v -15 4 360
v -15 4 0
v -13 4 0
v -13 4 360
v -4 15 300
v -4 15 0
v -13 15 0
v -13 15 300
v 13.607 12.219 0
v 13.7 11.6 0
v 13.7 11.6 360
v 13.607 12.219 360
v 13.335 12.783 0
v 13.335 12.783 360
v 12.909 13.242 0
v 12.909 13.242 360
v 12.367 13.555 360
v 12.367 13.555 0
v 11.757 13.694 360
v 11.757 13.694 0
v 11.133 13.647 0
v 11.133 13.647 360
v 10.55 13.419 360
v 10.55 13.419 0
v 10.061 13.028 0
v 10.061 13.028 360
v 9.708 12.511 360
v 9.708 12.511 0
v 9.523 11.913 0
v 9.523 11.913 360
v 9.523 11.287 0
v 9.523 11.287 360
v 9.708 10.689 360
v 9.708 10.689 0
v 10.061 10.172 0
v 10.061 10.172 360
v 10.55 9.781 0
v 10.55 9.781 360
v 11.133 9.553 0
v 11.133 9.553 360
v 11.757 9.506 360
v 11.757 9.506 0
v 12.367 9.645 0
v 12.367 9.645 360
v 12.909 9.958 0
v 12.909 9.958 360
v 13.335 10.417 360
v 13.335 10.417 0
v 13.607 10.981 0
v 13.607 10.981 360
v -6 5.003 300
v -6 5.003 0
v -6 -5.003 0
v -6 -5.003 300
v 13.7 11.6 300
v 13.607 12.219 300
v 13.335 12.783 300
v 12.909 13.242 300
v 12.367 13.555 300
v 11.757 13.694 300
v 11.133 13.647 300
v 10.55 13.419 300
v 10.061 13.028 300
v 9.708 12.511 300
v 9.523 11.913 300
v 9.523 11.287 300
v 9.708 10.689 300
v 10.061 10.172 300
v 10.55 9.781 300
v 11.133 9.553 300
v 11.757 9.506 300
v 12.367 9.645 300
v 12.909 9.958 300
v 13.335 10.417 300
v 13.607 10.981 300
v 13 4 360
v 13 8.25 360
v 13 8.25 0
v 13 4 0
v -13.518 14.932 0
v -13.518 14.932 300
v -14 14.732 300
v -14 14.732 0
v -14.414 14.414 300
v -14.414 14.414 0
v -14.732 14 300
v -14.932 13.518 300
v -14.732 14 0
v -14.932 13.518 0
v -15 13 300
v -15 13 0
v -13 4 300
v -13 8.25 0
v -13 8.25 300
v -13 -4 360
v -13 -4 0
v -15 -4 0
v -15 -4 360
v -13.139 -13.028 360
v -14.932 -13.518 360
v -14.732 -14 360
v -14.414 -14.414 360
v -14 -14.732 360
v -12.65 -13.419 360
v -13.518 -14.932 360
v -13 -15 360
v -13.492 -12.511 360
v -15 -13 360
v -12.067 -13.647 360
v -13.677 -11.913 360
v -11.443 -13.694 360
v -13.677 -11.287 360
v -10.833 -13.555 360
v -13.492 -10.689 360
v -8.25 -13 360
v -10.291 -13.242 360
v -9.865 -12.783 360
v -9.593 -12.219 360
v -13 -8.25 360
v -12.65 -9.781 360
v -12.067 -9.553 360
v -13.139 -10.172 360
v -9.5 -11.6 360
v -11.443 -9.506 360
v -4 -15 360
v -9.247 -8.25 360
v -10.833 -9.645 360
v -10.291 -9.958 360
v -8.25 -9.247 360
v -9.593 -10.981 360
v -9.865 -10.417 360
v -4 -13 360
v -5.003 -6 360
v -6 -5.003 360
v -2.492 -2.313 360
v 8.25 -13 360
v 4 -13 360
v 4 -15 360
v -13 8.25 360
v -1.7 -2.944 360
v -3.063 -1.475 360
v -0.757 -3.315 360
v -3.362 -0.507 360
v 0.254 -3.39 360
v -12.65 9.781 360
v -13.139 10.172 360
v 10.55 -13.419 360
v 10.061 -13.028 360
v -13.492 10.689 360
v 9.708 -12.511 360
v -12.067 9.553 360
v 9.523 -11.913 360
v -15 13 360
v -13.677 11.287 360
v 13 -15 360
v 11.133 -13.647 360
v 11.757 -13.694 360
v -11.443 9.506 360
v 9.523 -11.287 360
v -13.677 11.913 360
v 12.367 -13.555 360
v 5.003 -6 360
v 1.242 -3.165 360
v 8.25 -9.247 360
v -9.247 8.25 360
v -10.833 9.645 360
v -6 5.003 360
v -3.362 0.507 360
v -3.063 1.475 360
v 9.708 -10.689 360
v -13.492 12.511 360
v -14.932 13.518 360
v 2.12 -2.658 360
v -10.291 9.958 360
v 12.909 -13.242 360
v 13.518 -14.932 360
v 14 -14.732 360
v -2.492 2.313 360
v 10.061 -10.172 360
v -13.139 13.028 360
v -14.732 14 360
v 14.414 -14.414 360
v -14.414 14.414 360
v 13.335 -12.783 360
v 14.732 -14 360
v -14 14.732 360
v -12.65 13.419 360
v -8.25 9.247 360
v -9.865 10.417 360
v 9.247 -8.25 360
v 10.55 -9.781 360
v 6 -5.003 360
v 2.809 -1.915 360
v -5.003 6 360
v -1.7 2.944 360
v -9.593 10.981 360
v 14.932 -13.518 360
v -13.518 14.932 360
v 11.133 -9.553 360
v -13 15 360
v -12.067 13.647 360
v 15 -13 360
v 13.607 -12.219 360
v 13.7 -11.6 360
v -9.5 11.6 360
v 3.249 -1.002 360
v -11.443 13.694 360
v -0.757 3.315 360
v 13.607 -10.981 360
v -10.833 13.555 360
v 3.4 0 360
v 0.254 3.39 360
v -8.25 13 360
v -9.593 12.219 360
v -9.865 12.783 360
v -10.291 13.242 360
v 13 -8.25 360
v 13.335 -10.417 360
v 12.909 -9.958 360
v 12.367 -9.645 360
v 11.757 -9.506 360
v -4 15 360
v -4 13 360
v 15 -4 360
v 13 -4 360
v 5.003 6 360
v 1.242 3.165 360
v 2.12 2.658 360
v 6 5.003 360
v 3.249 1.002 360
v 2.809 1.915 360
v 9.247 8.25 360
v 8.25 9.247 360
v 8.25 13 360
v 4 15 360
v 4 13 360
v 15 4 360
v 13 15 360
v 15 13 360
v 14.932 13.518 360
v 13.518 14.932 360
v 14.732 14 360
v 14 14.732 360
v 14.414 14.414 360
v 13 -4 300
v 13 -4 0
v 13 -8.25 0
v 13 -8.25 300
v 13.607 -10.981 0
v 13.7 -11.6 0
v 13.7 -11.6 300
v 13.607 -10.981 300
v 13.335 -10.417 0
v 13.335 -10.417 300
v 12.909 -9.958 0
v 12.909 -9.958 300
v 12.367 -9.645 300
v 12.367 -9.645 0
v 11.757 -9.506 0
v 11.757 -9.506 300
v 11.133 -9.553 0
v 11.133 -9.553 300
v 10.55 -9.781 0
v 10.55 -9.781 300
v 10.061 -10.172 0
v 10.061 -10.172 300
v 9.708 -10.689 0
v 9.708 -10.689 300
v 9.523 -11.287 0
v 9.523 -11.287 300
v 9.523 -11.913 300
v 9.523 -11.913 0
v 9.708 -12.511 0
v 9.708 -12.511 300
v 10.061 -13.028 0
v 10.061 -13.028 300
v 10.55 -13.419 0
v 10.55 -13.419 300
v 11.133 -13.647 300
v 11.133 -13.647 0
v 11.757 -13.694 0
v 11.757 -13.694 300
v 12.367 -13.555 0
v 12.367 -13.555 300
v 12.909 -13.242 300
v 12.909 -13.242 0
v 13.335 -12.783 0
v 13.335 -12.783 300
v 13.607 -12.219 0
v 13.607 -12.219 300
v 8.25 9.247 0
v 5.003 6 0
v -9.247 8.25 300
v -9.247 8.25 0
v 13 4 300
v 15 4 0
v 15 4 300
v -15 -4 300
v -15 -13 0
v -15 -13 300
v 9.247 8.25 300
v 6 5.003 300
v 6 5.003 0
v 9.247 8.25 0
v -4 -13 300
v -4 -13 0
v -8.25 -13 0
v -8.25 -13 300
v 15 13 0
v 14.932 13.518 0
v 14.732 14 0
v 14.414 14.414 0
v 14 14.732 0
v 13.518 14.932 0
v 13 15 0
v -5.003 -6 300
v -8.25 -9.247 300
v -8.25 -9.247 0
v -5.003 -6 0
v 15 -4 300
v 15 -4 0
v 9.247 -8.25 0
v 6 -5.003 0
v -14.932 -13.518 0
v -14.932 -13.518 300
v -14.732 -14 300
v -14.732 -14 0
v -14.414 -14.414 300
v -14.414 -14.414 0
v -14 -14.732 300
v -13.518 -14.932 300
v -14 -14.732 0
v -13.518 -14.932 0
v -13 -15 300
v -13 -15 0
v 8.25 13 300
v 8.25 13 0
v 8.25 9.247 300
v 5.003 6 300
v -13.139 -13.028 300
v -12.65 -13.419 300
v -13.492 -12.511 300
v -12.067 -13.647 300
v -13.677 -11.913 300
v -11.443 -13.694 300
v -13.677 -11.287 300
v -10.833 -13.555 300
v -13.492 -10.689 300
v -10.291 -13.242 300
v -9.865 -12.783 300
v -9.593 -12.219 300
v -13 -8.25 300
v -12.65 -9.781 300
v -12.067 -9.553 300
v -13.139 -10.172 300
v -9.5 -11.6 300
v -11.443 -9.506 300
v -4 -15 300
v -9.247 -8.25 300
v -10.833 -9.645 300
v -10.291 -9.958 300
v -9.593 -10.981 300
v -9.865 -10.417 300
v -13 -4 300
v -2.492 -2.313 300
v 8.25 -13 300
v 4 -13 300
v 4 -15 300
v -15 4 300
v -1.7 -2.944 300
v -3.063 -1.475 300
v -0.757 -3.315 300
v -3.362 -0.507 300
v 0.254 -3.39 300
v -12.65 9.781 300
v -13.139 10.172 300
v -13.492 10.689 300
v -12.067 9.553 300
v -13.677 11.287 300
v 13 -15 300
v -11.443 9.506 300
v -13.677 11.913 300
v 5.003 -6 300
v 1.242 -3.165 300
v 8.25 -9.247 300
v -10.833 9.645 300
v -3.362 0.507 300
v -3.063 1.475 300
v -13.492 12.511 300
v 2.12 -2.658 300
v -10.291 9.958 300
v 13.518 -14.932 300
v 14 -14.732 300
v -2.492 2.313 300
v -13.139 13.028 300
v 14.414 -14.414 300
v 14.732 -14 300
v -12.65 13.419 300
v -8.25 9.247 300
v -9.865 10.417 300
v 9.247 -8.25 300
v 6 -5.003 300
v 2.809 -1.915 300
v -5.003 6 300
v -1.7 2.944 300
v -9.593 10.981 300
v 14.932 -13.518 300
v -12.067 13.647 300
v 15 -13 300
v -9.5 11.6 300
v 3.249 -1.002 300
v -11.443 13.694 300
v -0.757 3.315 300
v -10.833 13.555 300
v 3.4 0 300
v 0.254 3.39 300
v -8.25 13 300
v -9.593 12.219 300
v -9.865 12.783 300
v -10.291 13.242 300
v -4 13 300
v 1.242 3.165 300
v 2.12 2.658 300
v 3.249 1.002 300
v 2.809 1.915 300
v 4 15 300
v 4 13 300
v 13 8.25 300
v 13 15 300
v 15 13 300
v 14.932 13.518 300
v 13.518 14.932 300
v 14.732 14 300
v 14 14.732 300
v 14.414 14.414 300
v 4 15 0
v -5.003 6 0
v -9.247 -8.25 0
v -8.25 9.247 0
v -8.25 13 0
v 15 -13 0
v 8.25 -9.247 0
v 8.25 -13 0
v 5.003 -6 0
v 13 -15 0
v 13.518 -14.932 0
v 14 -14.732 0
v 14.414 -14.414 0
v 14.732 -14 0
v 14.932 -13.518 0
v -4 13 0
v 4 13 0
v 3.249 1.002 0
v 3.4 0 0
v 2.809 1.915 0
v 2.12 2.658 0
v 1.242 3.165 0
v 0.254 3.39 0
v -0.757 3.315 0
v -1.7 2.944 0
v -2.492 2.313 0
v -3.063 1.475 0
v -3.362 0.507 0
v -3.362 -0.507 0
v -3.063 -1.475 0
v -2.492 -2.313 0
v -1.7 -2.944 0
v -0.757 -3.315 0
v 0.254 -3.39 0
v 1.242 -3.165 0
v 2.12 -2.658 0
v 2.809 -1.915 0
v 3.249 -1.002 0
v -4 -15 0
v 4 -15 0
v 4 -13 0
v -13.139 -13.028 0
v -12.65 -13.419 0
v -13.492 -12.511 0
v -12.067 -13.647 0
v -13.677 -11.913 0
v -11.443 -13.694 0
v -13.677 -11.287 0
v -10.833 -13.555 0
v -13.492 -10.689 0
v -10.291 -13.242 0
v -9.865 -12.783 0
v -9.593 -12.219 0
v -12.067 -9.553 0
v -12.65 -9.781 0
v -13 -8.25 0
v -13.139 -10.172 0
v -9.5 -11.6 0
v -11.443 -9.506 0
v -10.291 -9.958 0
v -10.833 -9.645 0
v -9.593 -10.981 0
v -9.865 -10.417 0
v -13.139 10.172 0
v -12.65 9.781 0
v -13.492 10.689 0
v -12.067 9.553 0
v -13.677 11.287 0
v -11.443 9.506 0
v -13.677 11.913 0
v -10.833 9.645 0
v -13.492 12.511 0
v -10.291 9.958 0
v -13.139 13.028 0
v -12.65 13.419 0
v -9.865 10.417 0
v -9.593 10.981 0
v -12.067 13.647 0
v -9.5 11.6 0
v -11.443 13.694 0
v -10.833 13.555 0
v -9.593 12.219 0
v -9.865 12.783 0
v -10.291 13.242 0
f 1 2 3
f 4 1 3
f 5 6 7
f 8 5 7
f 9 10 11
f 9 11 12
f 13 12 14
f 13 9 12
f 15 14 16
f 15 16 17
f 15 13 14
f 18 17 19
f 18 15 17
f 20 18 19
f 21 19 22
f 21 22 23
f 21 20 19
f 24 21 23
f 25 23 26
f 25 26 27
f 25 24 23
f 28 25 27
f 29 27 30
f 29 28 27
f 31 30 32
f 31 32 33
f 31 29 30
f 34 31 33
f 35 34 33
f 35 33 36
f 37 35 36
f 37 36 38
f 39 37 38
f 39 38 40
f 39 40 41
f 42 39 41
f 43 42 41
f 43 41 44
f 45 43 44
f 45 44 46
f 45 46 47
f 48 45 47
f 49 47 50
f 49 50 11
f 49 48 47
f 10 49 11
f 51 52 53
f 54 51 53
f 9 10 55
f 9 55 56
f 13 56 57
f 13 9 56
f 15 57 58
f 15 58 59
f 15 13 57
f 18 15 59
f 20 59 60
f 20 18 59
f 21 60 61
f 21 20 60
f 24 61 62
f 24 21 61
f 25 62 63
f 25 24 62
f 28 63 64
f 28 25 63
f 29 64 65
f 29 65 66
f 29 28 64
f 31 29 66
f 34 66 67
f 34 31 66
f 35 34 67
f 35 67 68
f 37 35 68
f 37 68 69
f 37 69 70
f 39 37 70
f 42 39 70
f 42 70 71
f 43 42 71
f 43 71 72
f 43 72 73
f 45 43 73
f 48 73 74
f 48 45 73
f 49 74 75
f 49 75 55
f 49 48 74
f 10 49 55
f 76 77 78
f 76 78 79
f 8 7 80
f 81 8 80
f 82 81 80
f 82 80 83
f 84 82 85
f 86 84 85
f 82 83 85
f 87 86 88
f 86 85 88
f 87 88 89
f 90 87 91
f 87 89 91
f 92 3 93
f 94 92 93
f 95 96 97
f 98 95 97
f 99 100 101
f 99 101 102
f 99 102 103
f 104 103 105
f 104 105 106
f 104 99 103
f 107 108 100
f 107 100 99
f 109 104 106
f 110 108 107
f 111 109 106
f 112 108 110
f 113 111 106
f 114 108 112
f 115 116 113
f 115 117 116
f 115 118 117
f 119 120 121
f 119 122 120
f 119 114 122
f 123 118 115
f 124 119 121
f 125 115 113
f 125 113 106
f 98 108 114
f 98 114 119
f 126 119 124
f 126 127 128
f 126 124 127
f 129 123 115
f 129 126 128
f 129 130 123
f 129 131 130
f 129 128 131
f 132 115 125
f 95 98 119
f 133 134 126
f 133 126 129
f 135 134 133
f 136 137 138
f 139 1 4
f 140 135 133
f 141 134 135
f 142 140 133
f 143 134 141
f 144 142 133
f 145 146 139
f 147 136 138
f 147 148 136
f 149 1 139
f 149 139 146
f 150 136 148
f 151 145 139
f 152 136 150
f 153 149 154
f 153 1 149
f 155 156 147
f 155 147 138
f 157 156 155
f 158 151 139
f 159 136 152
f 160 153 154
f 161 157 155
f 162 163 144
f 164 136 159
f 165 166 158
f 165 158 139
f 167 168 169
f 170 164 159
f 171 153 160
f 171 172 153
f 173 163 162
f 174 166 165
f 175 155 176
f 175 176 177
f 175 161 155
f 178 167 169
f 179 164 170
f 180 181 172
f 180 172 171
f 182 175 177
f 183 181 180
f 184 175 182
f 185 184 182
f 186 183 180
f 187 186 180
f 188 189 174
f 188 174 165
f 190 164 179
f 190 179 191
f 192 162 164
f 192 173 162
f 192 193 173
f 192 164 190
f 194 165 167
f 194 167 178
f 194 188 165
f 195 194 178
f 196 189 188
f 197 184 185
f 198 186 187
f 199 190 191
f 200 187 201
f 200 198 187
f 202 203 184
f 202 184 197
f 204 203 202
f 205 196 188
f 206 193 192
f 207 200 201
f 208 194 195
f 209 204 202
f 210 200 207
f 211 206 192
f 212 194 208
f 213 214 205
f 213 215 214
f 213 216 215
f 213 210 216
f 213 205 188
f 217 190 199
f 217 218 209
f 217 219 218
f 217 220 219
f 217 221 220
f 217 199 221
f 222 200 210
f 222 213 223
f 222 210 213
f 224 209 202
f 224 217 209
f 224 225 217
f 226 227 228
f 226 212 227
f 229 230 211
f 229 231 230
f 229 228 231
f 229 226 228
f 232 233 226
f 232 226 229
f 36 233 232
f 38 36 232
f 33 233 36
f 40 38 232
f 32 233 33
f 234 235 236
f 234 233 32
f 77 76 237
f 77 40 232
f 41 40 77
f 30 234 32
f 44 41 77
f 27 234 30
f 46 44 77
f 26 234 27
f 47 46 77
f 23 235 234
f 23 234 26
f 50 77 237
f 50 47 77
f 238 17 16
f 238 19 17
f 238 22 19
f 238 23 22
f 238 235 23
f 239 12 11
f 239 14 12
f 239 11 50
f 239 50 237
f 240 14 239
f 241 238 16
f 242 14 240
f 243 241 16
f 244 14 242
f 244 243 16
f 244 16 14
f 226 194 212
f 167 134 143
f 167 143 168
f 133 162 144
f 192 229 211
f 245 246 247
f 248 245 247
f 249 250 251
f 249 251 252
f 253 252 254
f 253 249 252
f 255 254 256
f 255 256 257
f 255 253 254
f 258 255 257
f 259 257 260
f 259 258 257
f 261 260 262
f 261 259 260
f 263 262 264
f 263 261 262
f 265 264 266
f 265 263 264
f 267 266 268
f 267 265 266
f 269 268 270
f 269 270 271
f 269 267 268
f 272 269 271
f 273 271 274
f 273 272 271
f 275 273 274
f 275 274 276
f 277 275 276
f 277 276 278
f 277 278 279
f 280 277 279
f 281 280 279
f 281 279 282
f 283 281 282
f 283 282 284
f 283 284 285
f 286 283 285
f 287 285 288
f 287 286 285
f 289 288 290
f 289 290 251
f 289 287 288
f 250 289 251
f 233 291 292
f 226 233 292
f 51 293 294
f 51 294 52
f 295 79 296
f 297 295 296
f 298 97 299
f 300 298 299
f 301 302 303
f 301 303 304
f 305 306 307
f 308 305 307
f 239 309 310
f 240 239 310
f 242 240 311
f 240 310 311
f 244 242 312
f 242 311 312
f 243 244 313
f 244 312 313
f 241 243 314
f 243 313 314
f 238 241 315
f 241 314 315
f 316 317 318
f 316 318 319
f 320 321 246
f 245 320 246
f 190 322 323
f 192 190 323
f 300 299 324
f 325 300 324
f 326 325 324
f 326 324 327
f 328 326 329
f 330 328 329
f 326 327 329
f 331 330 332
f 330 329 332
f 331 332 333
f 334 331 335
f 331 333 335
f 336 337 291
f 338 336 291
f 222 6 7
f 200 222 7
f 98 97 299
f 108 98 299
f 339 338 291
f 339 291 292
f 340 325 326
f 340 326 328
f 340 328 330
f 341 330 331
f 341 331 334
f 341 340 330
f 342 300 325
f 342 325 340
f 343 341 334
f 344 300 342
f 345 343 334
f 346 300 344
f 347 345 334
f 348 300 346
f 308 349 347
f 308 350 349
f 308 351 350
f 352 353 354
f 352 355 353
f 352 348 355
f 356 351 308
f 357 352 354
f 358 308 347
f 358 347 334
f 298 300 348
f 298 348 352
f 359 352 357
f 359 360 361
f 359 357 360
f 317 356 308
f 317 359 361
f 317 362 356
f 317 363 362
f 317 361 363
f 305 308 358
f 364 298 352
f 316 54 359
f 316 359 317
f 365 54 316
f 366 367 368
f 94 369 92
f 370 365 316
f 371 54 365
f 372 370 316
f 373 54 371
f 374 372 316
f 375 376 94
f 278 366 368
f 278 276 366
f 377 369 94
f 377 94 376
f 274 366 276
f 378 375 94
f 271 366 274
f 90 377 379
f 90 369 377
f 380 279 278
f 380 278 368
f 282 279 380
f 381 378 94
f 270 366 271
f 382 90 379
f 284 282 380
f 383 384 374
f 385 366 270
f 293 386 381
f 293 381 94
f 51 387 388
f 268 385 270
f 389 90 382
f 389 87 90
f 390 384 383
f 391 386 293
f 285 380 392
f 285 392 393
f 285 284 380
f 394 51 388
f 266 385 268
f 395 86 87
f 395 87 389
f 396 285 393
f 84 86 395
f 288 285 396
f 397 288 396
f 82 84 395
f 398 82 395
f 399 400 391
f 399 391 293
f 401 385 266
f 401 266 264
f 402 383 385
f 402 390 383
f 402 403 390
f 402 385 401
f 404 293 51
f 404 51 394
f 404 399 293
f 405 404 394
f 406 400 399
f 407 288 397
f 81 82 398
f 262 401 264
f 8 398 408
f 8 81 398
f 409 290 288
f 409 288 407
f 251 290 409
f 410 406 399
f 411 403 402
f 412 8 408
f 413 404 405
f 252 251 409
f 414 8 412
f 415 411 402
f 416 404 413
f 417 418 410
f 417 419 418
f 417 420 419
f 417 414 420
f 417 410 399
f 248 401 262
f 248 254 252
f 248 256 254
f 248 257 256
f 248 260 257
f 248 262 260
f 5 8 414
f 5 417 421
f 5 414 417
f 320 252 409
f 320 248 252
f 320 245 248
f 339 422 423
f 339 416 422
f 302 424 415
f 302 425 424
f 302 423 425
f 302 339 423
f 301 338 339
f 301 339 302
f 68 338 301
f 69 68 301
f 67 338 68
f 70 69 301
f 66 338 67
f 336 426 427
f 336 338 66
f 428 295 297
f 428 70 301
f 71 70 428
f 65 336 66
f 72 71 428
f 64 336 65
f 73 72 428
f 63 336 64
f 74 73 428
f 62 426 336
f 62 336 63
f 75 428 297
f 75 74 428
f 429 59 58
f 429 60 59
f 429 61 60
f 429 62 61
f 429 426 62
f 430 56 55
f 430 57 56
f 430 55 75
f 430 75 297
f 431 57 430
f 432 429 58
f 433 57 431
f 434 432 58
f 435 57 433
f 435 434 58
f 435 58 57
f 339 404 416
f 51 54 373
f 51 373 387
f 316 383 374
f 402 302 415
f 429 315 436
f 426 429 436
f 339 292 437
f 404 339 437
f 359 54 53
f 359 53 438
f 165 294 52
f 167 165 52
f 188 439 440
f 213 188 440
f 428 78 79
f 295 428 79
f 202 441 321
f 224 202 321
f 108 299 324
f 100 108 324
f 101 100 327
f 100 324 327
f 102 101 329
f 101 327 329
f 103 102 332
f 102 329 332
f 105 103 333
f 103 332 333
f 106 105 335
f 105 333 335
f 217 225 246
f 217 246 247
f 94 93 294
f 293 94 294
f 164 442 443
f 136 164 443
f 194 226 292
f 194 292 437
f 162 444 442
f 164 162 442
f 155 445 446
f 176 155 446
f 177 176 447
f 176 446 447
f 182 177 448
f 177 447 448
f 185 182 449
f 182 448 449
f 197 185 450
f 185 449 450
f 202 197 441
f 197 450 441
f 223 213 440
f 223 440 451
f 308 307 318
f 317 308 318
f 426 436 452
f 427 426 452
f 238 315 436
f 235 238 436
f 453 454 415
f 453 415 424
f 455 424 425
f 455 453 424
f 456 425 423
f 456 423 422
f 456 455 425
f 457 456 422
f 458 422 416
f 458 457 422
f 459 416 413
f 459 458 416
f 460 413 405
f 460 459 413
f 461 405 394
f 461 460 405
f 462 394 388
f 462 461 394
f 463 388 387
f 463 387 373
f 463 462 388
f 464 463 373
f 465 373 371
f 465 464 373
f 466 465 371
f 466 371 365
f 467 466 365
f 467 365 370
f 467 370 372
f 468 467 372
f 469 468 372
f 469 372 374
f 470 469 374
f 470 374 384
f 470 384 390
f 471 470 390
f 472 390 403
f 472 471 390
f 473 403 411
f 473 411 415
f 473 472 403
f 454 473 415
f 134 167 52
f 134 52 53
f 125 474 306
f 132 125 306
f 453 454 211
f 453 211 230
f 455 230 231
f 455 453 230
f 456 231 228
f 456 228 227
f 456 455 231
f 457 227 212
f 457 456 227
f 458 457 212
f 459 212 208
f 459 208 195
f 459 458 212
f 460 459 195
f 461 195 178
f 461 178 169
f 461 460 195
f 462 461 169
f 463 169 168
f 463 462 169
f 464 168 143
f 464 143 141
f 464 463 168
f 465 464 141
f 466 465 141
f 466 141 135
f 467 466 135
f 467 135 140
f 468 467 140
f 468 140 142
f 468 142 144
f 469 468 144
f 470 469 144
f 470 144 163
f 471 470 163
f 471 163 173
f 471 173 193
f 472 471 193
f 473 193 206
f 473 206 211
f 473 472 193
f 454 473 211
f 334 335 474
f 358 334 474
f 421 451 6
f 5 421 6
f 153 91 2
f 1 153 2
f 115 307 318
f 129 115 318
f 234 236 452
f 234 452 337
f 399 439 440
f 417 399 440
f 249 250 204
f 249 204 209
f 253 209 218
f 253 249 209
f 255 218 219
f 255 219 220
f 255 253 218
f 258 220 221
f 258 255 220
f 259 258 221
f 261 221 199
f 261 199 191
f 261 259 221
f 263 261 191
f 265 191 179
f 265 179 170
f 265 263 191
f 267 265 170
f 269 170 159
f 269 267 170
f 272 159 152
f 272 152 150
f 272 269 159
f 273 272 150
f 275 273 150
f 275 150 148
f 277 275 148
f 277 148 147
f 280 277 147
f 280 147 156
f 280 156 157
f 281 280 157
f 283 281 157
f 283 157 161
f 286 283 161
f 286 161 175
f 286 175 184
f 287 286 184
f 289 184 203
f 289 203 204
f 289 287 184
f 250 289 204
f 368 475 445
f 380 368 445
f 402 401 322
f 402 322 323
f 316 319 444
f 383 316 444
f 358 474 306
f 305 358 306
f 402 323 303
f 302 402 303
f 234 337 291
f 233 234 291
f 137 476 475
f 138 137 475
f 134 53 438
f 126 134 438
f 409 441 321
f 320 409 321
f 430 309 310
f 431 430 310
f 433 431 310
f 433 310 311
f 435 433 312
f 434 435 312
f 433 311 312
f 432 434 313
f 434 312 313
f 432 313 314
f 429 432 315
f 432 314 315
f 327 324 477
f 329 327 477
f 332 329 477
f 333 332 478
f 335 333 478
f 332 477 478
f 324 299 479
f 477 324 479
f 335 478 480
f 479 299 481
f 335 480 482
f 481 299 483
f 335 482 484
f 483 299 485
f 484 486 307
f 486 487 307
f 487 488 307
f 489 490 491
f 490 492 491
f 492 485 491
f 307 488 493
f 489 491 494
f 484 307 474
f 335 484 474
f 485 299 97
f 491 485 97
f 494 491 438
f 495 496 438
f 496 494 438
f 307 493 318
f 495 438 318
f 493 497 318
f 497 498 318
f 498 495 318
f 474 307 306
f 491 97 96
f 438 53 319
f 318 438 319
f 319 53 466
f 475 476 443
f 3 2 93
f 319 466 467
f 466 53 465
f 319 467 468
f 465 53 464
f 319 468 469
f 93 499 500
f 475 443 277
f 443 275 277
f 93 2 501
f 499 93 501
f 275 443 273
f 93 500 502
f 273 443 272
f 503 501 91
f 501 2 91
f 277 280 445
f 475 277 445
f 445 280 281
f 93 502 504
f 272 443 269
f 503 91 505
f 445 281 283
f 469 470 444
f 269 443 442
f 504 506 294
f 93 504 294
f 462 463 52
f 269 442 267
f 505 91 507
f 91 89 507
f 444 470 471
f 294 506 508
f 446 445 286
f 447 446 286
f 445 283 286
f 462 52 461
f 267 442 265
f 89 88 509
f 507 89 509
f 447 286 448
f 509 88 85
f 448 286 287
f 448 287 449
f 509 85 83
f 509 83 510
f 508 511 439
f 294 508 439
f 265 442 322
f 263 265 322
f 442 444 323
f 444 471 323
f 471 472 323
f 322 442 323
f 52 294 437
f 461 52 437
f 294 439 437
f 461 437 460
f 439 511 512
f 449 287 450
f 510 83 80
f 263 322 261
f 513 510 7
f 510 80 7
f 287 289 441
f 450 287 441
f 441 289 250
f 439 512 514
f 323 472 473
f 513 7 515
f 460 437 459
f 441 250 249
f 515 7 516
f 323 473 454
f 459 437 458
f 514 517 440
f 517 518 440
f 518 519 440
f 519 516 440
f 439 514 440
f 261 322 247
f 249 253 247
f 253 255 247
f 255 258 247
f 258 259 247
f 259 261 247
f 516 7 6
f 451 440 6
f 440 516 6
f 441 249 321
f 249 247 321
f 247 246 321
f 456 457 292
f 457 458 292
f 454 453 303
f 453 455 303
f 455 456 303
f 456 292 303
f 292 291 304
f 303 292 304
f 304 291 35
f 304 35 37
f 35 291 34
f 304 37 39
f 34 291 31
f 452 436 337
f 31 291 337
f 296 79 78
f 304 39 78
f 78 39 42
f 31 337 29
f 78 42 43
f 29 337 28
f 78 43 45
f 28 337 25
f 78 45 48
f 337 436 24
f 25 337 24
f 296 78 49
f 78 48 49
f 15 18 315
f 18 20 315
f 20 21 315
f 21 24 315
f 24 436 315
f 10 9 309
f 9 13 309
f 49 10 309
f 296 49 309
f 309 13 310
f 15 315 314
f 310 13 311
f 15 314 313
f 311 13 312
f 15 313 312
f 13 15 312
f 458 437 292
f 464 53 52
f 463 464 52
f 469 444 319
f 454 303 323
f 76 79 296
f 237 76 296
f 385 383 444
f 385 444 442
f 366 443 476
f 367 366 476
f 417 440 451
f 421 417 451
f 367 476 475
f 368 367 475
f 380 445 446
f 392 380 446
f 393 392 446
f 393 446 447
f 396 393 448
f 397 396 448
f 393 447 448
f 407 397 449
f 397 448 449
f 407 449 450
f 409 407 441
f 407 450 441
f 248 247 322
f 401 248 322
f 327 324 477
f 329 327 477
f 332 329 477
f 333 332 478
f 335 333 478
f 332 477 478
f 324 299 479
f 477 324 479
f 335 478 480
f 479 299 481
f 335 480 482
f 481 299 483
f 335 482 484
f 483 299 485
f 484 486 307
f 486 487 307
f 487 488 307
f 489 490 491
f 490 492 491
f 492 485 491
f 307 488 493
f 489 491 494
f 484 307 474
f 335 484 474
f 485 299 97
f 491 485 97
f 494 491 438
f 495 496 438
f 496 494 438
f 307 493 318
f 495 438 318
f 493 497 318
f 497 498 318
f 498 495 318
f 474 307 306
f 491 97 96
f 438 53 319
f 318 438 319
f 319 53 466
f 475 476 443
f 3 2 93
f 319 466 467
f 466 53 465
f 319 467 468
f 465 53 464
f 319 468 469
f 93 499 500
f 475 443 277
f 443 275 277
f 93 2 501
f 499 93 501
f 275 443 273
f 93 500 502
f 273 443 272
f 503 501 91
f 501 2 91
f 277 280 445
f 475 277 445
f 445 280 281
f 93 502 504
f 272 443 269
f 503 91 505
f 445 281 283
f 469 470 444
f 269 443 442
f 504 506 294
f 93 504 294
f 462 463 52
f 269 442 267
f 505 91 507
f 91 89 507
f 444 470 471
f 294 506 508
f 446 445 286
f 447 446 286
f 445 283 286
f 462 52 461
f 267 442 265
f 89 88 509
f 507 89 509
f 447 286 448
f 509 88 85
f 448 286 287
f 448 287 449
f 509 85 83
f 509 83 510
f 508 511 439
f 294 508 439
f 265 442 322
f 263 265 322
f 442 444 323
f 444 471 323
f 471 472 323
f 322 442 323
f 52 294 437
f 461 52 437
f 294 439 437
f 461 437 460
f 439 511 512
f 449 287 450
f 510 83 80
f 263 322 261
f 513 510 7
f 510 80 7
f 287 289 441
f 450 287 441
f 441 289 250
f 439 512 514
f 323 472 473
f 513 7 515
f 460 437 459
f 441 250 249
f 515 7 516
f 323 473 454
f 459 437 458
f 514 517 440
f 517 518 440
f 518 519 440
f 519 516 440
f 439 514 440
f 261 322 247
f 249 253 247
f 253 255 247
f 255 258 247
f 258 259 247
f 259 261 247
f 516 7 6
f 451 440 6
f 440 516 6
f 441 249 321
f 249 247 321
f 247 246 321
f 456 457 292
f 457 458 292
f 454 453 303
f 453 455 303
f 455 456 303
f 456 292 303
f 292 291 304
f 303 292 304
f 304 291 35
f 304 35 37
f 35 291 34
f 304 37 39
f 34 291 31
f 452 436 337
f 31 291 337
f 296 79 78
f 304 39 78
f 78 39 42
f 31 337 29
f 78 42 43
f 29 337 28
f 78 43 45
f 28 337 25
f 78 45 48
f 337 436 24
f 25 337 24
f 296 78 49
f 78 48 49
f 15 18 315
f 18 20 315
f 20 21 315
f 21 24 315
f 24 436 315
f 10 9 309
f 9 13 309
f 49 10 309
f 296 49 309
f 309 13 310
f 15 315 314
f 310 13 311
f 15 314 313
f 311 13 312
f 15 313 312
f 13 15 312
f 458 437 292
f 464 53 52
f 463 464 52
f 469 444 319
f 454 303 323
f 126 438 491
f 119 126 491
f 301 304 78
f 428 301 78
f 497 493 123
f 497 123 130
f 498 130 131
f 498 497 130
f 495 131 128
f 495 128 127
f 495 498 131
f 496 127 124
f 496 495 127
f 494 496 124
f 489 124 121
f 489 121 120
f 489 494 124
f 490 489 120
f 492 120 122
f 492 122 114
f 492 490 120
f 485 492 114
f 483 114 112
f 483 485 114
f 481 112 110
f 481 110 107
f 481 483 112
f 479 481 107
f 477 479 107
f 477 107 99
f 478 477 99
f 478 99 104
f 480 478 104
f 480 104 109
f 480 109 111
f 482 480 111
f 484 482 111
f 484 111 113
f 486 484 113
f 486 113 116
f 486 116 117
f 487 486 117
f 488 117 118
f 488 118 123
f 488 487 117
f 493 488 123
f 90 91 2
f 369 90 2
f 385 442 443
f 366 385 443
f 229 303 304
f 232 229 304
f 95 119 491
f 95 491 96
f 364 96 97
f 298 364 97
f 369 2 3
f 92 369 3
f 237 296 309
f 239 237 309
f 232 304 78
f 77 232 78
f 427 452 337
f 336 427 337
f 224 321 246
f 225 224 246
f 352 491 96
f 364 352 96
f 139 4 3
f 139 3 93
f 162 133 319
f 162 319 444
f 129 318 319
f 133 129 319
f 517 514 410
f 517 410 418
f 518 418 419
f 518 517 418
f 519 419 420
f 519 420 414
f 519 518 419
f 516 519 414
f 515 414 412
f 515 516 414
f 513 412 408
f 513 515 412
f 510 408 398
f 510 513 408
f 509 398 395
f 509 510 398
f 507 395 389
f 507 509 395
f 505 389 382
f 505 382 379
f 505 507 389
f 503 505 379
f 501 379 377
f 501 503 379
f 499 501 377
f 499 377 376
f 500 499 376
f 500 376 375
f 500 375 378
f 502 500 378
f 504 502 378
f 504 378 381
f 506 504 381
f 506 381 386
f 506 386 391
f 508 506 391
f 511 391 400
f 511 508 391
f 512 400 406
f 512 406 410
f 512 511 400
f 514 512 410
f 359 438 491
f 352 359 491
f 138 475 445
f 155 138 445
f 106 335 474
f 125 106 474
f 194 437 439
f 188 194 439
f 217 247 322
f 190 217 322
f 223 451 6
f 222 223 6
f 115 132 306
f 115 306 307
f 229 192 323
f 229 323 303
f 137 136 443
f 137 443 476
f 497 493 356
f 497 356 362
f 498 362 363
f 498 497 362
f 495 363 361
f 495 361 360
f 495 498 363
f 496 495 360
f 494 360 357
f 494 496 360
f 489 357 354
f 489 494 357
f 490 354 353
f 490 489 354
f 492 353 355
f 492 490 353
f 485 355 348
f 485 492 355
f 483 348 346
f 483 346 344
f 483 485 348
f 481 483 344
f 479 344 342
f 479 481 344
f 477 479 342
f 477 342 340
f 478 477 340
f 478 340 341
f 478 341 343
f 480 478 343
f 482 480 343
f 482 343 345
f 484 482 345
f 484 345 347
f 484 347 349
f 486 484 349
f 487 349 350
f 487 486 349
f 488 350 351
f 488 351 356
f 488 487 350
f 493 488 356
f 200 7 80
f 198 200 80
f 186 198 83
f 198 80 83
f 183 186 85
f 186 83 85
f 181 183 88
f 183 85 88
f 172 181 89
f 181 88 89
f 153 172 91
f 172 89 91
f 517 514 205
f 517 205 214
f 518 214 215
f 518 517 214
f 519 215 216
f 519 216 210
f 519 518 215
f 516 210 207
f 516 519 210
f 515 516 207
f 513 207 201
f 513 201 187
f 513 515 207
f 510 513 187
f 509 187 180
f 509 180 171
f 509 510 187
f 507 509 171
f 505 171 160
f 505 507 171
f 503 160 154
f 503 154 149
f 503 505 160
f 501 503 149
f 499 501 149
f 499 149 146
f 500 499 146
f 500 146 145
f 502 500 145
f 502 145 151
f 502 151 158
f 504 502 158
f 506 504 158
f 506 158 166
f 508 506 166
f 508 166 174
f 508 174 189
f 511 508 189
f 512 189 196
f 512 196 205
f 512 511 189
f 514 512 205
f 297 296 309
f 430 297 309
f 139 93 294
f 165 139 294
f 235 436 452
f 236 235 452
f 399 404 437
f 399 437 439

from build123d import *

# Parameters (mm, degrees)
F0_R     = 2.1
F0_R_2   = 3.4
F1_DEPTH = 300
F2_DEPTH = 360


with BuildPart() as f1:
    # F0 (on Top) → F1 (new body)
    with BuildSketch(Plane.XY):
        with BuildLine():
            Line((13, 15), (4, 15))
            Line((4, 15), (4, 13))
            Line((4, 13), (8.25, 13))
            Line((8.25, 13), (8.25, 9.247021))
            Line((8.25, 9.247021), (5.002979, 6))
            Line((5.002979, 6), (0, 6))
            Line((0, 6), (-5.002979, 6))
            Line((-5.002979, 6), (-8.25, 9.247021))
            Line((-8.25, 9.247021), (-8.25, 13))
            Line((-8.25, 13), (-4, 13))
            Line((-4, 13), (-4, 15))
            Line((-4, 15), (-13, 15))
            ThreePointArc((-13, 15), (-14.414214, 14.414214), (-15, 13))
            Line((-15, 13), (-15, 4))
            Line((-15, 4), (-13, 4))
            Line((-13, 4), (-13, 8.25))
            Line((-13, 8.25), (-9.247021, 8.25))
            Line((-9.247021, 8.25), (-6, 5.002979))
            Line((-6, 5.002979), (-6, 0))
            Line((-6, 0), (-6, -5.002979))
            Line((-6, -5.002979), (-9.247021, -8.25))
            Line((-9.247021, -8.25), (-13, -8.25))
            Line((-13, -8.25), (-13, -4))
            Line((-13, -4), (-15, -4))
            Line((-15, -4), (-15, -13))
            ThreePointArc((-15, -13), (-14.414214, -14.414214), (-13, -15))
            Line((-13, -15), (-4, -15))
            Line((-4, -15), (-4, -13))
            Line((-4, -13), (-8.25, -13))
            Line((-8.25, -13), (-8.25, -9.247021))
            Line((-8.25, -9.247021), (-5.002979, -6))
            Line((-5.002979, -6), (0, -6))
            Line((0, -6), (5.002979, -6))
            Line((5.002979, -6), (8.25, -9.247021))
            Line((8.25, -9.247021), (8.25, -13))
            Line((8.25, -13), (4, -13))
            Line((4, -13), (4, -15))
            Line((4, -15), (13, -15))
            ThreePointArc((13, -15), (14.414214, -14.414214), (15, -13))
            Line((15, -13), (15, -4))
            Line((15, -4), (13, -4))
            Line((13, -4), (13, -8.25))
            Line((13, -8.25), (9.247021, -8.25))
            Line((9.247021, -8.25), (6, -5.002979))
            Line((6, -5.002979), (6, 0))
            Line((6, 0), (6, 5.002979))
            Line((6, 5.002979), (9.247021, 8.25))
            Line((9.247021, 8.25), (13, 8.25))
            Line((13, 8.25), (13, 4))
            Line((13, 4), (15, 4))
            Line((15, 4), (15, 13))
            ThreePointArc((15, 13), (14.414214, 14.414214), (13, 15))
        make_face()
        with Locations((-11.6, -11.6)):
            Circle(F0_R, mode=Mode.SUBTRACT)
        with Locations((11.6, -11.6)):
            Circle(F0_R, mode=Mode.SUBTRACT)
        with Locations((-11.6, 11.6)):
            Circle(F0_R, mode=Mode.SUBTRACT)
        Circle(F0_R_2, mode=Mode.SUBTRACT)
        with Locations((11.6, 11.6)):
            Circle(F0_R, mode=Mode.SUBTRACT)
    extrude(amount=F1_DEPTH)


with BuildPart() as f2:
    # F0 (on Top) → F2 (new body)
    with BuildSketch(Plane.XY):
        with BuildLine():
            Line((13, 15), (4, 15))
            Line((4, 15), (4, 13))
            Line((4, 13), (8.25, 13))
            Line((8.25, 13), (8.25, 9.247021))
            Line((8.25, 9.247021), (5.002979, 6))
            Line((5.002979, 6), (0, 6))
            Line((0, 6), (-5.002979, 6))
            Line((-5.002979, 6), (-8.25, 9.247021))
            Line((-8.25, 9.247021), (-8.25, 13))
            Line((-8.25, 13), (-4, 13))
            Line((-4, 13), (-4, 15))
            Line((-4, 15), (-13, 15))
            ThreePointArc((-13, 15), (-14.414214, 14.414214), (-15, 13))
            Line((-15, 13), (-15, 4))
            Line((-15, 4), (-13, 4))
            Line((-13, 4), (-13, 8.25))
            Line((-13, 8.25), (-9.247021, 8.25))
            Line((-9.247021, 8.25), (-6, 5.002979))
            Line((-6, 5.002979), (-6, 0))
            Line((-6, 0), (-6, -5.002979))
            Line((-6, -5.002979), (-9.247021, -8.25))
            Line((-9.247021, -8.25), (-13, -8.25))
            Line((-13, -8.25), (-13, -4))
            Line((-13, -4), (-15, -4))
            Line((-15, -4), (-15, -13))
            ThreePointArc((-15, -13), (-14.414214, -14.414214), (-13, -15))
            Line((-13, -15), (-4, -15))
            Line((-4, -15), (-4, -13))
            Line((-4, -13), (-8.25, -13))
            Line((-8.25, -13), (-8.25, -9.247021))
            Line((-8.25, -9.247021), (-5.002979, -6))
            Line((-5.002979, -6), (0, -6))
            Line((0, -6), (5.002979, -6))
            Line((5.002979, -6), (8.25, -9.247021))
            Line((8.25, -9.247021), (8.25, -13))
            Line((8.25, -13), (4, -13))
            Line((4, -13), (4, -15))
            Line((4, -15), (13, -15))
            ThreePointArc((13, -15), (14.414214, -14.414214), (15, -13))
            Line((15, -13), (15, -4))
            Line((15, -4), (13, -4))
            Line((13, -4), (13, -8.25))
            Line((13, -8.25), (9.247021, -8.25))
            Line((9.247021, -8.25), (6, -5.002979))
            Line((6, -5.002979), (6, 0))
            Line((6, 0), (6, 5.002979))
            Line((6, 5.002979), (9.247021, 8.25))
            Line((9.247021, 8.25), (13, 8.25))
            Line((13, 8.25), (13, 4))
            Line((13, 4), (15, 4))
            Line((15, 4), (15, 13))
            ThreePointArc((15, 13), (14.414214, 14.414214), (13, 15))
        make_face()
        with Locations((-11.6, -11.6)):
            Circle(F0_R, mode=Mode.SUBTRACT)
        with Locations((11.6, -11.6)):
            Circle(F0_R, mode=Mode.SUBTRACT)
        with Locations((-11.6, 11.6)):
            Circle(F0_R, mode=Mode.SUBTRACT)
        Circle(F0_R_2, mode=Mode.SUBTRACT)
        with Locations((11.6, 11.6)):
            Circle(F0_R, mode=Mode.SUBTRACT)
    extrude(amount=F2_DEPTH)


solid = Compound([f1.part, f2.part])
